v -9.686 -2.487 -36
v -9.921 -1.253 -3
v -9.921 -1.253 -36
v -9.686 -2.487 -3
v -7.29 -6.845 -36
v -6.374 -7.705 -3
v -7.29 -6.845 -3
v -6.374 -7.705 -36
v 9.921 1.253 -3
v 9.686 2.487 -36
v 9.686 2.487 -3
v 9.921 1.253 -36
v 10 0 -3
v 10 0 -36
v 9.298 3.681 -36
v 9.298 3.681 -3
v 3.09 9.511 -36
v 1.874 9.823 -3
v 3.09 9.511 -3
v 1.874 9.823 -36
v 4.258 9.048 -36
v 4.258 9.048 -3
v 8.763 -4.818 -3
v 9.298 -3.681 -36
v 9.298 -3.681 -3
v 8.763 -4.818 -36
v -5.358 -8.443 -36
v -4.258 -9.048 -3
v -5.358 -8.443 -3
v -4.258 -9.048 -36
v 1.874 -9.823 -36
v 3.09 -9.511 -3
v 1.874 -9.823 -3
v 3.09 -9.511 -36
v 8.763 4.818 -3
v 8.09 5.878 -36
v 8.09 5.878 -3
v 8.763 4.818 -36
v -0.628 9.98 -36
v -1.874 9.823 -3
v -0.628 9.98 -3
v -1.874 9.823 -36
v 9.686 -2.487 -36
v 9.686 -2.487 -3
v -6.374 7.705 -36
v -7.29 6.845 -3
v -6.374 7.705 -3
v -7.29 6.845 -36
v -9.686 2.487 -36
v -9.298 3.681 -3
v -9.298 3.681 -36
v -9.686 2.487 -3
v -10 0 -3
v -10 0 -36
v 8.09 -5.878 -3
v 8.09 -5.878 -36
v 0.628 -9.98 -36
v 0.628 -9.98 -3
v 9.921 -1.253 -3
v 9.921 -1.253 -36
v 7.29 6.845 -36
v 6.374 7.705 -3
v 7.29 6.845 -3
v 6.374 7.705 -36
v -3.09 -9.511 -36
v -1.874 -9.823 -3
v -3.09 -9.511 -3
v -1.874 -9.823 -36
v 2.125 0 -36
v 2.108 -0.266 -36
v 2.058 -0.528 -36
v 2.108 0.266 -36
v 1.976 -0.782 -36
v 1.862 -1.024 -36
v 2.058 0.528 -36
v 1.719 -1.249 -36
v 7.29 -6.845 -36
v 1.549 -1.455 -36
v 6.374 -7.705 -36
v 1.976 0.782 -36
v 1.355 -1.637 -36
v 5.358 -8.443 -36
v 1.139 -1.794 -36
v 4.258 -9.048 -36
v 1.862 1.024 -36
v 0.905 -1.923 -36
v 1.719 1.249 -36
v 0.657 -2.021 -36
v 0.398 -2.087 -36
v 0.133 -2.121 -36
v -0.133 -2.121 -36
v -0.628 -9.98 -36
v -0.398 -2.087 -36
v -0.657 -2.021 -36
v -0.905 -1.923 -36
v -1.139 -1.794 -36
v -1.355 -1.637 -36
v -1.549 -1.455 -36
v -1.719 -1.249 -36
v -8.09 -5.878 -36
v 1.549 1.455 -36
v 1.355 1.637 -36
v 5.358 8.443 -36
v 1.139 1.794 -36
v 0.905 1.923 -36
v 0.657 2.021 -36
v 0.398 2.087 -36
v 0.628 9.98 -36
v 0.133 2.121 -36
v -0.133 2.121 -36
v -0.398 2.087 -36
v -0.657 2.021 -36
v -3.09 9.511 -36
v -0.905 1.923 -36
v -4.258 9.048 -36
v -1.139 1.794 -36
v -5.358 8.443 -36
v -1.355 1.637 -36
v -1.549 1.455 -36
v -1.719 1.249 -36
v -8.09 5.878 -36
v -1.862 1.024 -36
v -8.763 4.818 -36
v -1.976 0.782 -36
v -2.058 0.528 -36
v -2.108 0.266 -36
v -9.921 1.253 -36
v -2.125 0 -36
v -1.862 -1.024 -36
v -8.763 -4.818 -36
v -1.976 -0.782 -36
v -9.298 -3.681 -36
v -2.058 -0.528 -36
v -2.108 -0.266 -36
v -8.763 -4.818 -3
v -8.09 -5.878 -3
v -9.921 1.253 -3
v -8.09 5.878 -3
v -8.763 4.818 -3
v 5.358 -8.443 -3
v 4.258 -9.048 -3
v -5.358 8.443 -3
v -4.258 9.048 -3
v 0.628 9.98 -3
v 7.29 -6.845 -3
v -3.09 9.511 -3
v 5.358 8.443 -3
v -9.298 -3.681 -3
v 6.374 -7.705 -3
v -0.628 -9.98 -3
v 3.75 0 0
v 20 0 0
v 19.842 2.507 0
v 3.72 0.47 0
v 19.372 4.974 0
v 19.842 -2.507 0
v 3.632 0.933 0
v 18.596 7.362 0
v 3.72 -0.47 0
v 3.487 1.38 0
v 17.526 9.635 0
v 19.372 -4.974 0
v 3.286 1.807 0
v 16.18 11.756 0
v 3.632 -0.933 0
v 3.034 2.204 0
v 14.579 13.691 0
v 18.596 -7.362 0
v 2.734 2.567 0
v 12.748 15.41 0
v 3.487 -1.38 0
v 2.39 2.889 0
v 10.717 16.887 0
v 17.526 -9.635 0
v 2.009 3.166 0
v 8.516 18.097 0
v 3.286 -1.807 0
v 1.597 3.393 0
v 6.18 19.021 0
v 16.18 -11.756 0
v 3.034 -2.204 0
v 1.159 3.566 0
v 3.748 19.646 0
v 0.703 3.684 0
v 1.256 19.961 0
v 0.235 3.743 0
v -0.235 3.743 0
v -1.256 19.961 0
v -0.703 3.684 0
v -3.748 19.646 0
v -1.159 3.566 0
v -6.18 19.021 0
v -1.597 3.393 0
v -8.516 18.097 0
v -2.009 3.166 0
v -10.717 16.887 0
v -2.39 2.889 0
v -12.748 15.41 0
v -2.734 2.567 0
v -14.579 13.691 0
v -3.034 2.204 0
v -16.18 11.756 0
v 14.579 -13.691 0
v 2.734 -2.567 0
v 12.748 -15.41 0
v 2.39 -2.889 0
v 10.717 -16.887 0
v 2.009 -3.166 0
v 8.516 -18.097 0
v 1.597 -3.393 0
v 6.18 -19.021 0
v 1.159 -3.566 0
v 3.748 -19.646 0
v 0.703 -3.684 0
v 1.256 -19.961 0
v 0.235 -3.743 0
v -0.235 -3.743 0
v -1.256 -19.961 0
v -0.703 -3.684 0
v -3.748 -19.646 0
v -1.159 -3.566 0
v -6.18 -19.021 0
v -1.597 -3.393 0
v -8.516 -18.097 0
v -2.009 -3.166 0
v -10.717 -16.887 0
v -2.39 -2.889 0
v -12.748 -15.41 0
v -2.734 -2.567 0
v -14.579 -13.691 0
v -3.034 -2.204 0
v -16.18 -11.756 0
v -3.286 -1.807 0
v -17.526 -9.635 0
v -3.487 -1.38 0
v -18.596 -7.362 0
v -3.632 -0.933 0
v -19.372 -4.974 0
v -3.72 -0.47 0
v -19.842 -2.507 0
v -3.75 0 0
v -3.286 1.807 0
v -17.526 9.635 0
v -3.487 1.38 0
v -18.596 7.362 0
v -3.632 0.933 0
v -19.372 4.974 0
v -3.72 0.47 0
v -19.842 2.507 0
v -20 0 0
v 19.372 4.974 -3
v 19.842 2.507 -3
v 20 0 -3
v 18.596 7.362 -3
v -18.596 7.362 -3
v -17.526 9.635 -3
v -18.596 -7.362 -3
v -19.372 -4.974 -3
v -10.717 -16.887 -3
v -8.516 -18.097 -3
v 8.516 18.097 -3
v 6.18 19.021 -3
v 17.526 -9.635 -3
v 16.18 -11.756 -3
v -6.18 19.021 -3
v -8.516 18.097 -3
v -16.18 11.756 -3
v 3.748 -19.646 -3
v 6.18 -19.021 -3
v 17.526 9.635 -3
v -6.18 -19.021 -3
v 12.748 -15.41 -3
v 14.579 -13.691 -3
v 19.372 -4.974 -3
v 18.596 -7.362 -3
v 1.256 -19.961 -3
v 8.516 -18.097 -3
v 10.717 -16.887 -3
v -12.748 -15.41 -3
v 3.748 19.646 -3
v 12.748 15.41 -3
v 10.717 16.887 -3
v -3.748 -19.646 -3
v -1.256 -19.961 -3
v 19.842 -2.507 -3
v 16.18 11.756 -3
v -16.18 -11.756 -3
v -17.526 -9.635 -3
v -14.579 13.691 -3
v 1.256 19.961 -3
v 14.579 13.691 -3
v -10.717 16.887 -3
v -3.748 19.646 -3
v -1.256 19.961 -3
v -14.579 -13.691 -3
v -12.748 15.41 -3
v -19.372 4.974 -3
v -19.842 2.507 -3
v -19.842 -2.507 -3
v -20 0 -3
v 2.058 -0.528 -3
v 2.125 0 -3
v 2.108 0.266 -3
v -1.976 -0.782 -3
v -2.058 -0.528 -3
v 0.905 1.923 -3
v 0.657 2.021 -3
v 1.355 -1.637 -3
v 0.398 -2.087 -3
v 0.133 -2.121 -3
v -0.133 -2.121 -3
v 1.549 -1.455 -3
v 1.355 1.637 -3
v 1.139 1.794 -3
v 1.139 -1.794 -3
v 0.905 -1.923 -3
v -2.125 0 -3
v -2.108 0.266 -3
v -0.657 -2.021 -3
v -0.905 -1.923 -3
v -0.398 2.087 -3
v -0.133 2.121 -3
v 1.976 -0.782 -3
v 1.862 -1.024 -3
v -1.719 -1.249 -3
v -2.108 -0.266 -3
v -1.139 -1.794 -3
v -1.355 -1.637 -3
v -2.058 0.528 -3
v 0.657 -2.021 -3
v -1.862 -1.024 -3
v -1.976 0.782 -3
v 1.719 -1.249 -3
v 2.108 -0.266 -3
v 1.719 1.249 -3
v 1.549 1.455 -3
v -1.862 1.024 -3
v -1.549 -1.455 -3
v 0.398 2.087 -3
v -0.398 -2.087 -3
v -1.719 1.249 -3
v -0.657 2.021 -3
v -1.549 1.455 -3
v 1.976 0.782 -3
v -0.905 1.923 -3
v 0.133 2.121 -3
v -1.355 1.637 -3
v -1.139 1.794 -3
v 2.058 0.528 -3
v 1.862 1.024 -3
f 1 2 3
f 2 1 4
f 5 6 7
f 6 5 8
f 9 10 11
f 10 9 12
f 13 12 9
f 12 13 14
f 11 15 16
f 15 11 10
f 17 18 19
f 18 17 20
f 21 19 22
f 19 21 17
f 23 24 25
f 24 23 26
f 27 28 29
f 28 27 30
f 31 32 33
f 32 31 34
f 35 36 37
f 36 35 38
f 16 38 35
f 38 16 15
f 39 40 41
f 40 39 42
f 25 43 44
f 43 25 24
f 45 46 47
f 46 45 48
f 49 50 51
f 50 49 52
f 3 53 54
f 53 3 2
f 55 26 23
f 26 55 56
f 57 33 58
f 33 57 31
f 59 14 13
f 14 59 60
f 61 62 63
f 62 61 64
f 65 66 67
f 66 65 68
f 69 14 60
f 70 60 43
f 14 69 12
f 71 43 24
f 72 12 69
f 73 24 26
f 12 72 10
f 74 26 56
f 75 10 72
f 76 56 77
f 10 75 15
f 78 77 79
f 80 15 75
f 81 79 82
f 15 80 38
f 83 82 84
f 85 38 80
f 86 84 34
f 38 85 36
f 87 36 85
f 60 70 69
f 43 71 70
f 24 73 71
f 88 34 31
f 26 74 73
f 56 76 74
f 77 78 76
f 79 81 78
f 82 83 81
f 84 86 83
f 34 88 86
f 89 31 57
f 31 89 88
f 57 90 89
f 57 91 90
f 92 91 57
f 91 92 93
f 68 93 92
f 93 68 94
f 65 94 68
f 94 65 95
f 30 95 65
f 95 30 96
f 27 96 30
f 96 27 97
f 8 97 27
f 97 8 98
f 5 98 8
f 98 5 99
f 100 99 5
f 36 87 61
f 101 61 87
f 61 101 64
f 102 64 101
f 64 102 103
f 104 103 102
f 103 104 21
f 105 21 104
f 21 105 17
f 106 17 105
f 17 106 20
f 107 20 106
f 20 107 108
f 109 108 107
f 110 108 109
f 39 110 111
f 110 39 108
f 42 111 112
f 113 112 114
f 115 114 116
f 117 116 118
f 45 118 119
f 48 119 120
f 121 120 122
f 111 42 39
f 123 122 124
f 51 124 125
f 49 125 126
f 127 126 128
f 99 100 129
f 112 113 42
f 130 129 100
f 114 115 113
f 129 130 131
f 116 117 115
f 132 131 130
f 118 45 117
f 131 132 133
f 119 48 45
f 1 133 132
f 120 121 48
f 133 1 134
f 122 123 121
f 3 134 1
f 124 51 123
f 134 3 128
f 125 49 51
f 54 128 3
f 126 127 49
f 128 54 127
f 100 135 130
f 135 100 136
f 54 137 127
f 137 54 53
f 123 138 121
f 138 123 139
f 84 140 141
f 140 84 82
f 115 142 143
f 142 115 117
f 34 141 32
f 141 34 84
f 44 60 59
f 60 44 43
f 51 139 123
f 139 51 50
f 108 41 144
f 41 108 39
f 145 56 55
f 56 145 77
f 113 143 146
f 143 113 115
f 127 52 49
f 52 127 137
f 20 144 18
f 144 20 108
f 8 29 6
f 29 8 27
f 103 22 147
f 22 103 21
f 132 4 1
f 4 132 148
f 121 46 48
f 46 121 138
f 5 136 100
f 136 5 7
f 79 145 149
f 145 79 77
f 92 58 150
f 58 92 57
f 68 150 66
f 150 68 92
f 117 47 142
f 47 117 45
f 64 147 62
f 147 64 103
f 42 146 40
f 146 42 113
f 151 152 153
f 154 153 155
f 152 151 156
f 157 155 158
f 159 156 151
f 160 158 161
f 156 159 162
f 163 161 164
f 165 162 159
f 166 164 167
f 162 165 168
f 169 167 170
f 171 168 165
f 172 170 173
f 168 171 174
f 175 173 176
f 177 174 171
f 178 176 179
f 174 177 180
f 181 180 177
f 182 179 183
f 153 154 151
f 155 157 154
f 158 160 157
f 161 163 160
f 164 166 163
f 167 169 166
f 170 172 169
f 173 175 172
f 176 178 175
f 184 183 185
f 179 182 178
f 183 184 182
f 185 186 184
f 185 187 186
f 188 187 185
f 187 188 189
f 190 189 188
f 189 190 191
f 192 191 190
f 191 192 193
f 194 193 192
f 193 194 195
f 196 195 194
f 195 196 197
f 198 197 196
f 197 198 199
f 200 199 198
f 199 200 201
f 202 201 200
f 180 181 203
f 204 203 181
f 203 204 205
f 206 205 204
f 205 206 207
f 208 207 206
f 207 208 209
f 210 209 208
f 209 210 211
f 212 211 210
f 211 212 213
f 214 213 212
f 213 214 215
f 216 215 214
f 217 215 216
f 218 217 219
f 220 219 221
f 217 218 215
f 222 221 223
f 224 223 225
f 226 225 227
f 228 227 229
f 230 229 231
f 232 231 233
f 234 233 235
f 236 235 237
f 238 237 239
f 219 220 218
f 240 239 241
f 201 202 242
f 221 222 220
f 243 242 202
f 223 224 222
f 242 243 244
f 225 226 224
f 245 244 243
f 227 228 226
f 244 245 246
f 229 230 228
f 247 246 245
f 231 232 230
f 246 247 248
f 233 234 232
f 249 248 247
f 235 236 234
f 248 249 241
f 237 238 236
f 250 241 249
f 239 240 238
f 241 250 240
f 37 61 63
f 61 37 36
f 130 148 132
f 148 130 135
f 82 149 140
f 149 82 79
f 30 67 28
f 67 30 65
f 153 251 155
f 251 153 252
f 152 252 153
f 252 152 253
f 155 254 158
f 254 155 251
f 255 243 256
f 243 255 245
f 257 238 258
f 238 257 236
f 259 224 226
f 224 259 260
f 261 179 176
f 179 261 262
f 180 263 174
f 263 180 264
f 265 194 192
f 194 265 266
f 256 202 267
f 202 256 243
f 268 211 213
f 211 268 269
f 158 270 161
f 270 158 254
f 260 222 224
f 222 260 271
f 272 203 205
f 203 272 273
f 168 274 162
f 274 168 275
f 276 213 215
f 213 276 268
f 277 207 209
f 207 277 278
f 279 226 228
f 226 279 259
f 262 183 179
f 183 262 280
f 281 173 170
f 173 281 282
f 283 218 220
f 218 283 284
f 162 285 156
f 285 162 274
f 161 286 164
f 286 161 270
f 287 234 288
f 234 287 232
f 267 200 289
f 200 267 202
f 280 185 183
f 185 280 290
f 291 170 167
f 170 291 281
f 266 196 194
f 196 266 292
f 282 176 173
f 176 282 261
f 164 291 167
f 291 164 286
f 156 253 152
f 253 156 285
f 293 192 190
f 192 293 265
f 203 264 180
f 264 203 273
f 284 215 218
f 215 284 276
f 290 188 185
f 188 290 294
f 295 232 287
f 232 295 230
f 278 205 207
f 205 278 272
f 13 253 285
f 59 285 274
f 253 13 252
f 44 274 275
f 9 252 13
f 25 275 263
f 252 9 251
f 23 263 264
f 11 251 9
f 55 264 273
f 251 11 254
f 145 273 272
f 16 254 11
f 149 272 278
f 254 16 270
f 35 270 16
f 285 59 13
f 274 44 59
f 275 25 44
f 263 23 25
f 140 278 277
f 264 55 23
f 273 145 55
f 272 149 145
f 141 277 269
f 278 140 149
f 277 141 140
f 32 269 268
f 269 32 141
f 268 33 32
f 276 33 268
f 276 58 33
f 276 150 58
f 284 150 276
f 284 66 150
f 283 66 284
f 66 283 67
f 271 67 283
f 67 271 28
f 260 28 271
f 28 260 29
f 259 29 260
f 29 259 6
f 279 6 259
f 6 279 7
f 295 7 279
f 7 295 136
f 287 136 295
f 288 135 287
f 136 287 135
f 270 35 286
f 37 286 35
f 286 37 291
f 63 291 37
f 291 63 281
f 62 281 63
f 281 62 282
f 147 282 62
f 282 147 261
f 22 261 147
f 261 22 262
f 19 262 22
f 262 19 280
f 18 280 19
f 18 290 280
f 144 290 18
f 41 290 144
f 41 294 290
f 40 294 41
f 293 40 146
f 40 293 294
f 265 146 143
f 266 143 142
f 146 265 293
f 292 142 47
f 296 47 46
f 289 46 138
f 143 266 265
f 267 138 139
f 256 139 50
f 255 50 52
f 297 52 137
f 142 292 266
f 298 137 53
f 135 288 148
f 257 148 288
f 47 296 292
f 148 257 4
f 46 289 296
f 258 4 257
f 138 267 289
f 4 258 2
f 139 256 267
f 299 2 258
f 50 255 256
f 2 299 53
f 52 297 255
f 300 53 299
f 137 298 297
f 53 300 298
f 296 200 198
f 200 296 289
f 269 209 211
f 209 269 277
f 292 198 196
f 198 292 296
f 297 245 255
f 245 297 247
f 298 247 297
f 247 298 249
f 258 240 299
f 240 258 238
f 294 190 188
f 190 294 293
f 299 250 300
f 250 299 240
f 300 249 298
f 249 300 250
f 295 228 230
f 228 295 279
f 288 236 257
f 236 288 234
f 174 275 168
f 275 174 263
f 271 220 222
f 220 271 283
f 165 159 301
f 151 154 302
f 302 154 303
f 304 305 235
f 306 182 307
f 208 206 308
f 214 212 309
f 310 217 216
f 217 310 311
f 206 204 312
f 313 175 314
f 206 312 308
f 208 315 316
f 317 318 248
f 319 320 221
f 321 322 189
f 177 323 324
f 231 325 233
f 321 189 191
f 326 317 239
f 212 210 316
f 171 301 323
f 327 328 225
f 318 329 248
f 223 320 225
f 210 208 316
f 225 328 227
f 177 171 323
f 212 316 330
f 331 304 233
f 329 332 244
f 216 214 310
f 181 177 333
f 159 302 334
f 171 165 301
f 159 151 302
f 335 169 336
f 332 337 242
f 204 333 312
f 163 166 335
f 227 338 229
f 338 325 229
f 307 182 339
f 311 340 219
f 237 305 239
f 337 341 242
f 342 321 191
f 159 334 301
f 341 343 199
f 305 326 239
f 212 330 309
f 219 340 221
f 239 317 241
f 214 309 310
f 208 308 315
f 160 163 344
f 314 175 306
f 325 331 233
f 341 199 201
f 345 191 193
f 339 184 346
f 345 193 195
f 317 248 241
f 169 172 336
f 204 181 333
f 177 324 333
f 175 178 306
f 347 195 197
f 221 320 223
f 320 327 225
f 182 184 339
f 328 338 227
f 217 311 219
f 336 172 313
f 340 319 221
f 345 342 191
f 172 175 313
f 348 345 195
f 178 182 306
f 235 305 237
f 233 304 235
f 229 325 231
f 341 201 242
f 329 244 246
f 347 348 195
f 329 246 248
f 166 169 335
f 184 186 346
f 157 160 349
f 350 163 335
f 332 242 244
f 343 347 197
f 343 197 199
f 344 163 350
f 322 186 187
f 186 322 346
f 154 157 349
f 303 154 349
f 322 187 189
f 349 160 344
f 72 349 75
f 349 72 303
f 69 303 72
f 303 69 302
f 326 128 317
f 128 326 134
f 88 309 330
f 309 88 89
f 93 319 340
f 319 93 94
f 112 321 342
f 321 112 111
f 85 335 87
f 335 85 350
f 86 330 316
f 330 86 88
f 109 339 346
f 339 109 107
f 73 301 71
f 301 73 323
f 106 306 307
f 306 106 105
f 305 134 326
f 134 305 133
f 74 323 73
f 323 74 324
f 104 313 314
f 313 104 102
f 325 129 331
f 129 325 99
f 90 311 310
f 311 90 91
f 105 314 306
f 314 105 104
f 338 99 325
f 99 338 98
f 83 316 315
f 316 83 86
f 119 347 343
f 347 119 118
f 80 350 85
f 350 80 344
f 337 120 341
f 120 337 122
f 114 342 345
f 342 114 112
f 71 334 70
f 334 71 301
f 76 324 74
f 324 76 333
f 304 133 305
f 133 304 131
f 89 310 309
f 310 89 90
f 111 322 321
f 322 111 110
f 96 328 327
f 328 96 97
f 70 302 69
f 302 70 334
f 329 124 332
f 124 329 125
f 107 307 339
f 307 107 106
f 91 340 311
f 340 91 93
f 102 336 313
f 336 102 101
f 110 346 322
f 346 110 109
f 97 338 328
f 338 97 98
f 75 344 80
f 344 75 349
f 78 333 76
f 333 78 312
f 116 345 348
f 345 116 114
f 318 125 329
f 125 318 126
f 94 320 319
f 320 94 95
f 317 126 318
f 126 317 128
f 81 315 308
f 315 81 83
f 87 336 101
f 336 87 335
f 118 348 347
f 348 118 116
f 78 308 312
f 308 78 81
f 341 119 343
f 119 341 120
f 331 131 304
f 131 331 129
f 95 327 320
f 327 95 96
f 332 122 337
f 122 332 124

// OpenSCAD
$fn = 50;


difference() {
	union() {
		translate(v = [0, 0, -36.0000000000]) {
			cylinder(h = 36, r = 10.0000000000);
		}
		translate(v = [0, 0, -3.0000000000]) {
			cylinder(h = 3, r = 20.0000000000);
		}
	}
	union() {
		translate(v = [0, 0, 0]) {
			rotate(a = [0, 0, 0]) {
				difference() {
					union() {
						#translate(v = [0, 0, -36.0000000000]) {
							cylinder(h = 36, r = 2.0000000000);
						}
						#translate(v = [0, 0, -3]) {
							cylinder(h = 3, r1 = 2.1250000000, r2 = 3.7500000000);
						}
						#translate(v = [0, 0, -36.0000000000]) {
							cylinder(h = 36, r = 2.1250000000);
						}
						#translate(v = [0, 0, -36.0000000000]) {
							cylinder(h = 36, r = 2.0000000000);
						}
					}
					union();
				}
			}
		}
	}
}
